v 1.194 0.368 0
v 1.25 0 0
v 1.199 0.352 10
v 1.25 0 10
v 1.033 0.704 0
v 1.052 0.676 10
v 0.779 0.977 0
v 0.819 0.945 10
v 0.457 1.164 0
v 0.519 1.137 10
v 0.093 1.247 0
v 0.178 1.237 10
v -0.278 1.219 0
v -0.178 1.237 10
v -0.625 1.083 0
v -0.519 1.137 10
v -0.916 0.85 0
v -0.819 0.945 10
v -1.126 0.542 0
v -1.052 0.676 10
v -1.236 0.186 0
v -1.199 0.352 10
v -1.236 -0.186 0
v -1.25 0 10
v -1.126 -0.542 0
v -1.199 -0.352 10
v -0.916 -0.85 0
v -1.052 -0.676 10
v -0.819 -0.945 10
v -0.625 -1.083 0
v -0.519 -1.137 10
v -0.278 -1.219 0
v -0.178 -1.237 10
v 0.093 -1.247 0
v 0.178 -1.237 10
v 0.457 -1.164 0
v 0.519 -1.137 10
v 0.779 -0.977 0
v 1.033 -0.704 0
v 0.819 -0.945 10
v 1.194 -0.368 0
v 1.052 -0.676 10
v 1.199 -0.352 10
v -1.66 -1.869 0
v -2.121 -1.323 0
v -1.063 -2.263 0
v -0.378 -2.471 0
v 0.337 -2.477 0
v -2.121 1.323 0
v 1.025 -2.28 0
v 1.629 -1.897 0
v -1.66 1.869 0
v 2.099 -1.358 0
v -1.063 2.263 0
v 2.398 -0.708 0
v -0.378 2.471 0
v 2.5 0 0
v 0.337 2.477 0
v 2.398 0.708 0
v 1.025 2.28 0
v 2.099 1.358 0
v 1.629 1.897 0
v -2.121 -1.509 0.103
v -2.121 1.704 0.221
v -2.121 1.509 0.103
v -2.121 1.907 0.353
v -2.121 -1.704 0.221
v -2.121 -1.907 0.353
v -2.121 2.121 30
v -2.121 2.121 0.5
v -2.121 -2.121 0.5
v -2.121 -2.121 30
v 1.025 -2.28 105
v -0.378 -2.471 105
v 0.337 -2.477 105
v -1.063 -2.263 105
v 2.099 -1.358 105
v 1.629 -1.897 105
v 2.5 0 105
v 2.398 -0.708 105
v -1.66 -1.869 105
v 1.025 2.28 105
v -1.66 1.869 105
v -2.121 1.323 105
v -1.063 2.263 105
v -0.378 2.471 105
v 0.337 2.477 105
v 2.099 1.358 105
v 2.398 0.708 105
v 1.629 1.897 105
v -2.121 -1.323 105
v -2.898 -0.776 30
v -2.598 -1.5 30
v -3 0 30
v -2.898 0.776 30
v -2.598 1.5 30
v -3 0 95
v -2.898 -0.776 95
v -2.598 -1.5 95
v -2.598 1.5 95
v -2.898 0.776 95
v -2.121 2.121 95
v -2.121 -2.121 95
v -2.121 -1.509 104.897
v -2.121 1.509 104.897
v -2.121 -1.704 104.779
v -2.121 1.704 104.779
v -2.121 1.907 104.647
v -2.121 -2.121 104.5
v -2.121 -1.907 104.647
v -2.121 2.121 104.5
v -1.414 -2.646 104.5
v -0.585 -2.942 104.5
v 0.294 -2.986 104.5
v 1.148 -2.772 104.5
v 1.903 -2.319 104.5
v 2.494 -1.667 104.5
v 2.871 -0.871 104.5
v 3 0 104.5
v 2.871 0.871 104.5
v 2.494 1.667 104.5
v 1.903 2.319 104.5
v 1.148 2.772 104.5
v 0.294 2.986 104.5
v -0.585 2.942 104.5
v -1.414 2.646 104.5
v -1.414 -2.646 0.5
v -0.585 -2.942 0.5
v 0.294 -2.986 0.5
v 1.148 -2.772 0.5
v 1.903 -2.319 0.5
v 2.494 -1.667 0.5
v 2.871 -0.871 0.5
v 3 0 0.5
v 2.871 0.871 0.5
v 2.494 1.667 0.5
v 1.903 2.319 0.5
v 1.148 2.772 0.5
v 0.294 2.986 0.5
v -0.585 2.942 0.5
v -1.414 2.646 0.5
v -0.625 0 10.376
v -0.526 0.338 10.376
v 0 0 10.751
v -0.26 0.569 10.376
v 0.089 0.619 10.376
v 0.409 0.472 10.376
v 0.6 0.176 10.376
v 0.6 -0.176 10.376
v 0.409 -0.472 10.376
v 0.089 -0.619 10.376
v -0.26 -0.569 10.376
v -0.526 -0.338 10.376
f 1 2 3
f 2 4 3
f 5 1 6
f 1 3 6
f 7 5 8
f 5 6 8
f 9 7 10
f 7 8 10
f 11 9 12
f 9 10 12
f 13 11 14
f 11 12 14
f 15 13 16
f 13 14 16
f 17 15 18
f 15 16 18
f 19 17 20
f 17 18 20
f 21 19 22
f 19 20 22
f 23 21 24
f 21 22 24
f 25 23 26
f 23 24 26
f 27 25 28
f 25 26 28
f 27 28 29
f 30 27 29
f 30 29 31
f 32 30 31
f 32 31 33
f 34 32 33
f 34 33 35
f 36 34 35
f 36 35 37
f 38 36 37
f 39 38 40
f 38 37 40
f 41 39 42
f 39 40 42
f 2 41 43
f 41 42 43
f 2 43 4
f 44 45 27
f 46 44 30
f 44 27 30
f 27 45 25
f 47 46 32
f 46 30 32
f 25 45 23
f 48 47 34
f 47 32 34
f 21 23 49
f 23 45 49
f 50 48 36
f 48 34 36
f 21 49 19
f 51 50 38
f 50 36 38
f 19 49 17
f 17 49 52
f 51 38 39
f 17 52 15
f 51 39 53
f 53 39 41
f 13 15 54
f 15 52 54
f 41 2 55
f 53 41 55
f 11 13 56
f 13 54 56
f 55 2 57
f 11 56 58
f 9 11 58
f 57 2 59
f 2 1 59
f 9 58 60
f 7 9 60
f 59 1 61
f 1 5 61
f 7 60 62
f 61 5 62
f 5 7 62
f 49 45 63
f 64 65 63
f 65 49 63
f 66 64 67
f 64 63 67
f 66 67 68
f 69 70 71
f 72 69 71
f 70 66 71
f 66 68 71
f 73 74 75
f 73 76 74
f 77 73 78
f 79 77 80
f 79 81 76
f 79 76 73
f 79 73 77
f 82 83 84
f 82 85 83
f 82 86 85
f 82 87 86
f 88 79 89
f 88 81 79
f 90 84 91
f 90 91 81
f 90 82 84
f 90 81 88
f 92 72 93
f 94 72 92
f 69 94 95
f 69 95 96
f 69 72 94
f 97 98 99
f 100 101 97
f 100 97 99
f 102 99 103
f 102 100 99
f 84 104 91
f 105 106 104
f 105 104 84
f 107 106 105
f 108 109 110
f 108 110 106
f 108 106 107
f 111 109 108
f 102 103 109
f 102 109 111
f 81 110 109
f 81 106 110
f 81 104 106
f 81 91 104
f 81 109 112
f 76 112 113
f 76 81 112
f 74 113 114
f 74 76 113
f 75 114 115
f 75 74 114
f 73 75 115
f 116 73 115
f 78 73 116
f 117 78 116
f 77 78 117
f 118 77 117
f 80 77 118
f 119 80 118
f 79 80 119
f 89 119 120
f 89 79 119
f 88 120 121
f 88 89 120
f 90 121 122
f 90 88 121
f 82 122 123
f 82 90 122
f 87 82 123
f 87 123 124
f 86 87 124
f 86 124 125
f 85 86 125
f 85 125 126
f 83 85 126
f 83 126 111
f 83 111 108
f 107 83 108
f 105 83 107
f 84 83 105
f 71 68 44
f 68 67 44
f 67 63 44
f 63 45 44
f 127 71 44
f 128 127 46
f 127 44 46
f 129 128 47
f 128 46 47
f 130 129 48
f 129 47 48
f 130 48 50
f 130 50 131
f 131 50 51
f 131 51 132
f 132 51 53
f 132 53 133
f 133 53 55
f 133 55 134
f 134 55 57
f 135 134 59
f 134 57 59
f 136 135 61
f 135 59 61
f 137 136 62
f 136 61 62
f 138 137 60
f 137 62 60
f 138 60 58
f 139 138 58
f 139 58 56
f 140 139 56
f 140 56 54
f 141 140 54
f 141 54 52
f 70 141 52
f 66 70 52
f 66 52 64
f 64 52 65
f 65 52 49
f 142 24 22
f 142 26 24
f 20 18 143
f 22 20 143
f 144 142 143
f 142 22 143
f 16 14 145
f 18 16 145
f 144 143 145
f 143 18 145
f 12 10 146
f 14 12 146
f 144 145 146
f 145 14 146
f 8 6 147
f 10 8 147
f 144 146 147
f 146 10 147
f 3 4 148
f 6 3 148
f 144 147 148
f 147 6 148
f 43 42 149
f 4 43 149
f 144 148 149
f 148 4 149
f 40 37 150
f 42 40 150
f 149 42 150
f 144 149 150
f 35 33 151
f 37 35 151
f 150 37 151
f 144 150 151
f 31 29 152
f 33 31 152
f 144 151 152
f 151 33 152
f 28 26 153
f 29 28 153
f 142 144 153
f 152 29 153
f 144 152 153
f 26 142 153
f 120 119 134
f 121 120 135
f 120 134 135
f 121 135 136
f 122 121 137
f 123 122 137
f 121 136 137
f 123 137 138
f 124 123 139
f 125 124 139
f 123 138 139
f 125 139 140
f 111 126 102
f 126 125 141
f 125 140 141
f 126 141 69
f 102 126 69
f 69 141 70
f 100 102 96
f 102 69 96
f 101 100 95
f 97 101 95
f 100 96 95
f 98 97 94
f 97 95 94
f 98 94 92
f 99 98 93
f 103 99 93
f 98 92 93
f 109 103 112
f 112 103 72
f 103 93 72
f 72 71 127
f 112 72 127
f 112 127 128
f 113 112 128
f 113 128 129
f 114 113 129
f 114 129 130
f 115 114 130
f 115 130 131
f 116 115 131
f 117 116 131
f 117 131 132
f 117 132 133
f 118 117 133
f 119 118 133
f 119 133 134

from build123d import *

# Parameters (mm, degrees)
SKETCH_1_R          = 3
EXTRUDE_1_DEPTH     = 105
CUT_EXTRUDE_1_DEPTH = 30
CUT_EXTRUDE_START   = -10
CUT_EXTRUDE_2_DEPTH = 10
M3X0_5_1_D          = 2.5
M3X0_5_1_DEPTH      = 10
M3X0_5_1_TIP        = 0.751075774
CHAMFER_1_SIZE      = 0.5


with BuildPart() as part:
    # 草图1 → 凸台-拉伸1 (new body)
    with BuildSketch(Plane.XY):
        Circle(SKETCH_1_R)
    extrude(amount=EXTRUDE_1_DEPTH)

    # 草图2 → 切除-拉伸1 (cut)
    with BuildSketch(Plane(origin=(0, 0, 0), x_dir=(-1, 0, 0), z_dir=(0, 0, -1))):
        with BuildLine():
            ThreePointArc((3, 0), (2.771638598, 1.148050297), (2.121320344, 2.121320344))
            Line((2.121320344, 2.121320344), (2.121320344, -2.121320344))
            ThreePointArc((2.121320344, -2.121320344), (2.771638598, -1.148050297), (3, 0))
        make_face()
    extrude(amount=-CUT_EXTRUDE_1_DEPTH, mode=Mode.SUBTRACT)

    # 草图3 → 切除-拉伸2 (cut)
    with BuildSketch(Plane.XY.offset(105).offset(CUT_EXTRUDE_START)):
        with BuildLine():
            Line((-2.121320344, -2.121320344), (-2.121320344, 2.121320344))
            ThreePointArc((-2.121320344, 2.121320344), (-3, 0), (-2.121320344, -2.121320344))
        make_face()
    extrude(amount=CUT_EXTRUDE_2_DEPTH, mode=Mode.SUBTRACT)

    # M3x0.5 螺纹孔1
    with Locations(Plane(origin=(0, 0, 0), x_dir=(-1, 0, 0), z_dir=(0, 0, -1))):
        with Locations((0, 0)):
            Hole(M3X0_5_1_D / 2, depth=M3X0_5_1_DEPTH)
            with Locations((0, 0, -(M3X0_5_1_DEPTH + M3X0_5_1_TIP / 2))):  # 118° drill point
                Cone(0, M3X0_5_1_D / 2, M3X0_5_1_TIP, mode=Mode.SUBTRACT)

    # 倒角1
    chamfer_1_edges = [part.edges().sort_by_distance(p)[0] for p in [
        (1.148050297, -2.771638598, 105),
        (1.148050297, 2.771638598, 0),
    ]]
    chamfer(chamfer_1_edges, length=CHAMFER_1_SIZE)


solid = part.part
